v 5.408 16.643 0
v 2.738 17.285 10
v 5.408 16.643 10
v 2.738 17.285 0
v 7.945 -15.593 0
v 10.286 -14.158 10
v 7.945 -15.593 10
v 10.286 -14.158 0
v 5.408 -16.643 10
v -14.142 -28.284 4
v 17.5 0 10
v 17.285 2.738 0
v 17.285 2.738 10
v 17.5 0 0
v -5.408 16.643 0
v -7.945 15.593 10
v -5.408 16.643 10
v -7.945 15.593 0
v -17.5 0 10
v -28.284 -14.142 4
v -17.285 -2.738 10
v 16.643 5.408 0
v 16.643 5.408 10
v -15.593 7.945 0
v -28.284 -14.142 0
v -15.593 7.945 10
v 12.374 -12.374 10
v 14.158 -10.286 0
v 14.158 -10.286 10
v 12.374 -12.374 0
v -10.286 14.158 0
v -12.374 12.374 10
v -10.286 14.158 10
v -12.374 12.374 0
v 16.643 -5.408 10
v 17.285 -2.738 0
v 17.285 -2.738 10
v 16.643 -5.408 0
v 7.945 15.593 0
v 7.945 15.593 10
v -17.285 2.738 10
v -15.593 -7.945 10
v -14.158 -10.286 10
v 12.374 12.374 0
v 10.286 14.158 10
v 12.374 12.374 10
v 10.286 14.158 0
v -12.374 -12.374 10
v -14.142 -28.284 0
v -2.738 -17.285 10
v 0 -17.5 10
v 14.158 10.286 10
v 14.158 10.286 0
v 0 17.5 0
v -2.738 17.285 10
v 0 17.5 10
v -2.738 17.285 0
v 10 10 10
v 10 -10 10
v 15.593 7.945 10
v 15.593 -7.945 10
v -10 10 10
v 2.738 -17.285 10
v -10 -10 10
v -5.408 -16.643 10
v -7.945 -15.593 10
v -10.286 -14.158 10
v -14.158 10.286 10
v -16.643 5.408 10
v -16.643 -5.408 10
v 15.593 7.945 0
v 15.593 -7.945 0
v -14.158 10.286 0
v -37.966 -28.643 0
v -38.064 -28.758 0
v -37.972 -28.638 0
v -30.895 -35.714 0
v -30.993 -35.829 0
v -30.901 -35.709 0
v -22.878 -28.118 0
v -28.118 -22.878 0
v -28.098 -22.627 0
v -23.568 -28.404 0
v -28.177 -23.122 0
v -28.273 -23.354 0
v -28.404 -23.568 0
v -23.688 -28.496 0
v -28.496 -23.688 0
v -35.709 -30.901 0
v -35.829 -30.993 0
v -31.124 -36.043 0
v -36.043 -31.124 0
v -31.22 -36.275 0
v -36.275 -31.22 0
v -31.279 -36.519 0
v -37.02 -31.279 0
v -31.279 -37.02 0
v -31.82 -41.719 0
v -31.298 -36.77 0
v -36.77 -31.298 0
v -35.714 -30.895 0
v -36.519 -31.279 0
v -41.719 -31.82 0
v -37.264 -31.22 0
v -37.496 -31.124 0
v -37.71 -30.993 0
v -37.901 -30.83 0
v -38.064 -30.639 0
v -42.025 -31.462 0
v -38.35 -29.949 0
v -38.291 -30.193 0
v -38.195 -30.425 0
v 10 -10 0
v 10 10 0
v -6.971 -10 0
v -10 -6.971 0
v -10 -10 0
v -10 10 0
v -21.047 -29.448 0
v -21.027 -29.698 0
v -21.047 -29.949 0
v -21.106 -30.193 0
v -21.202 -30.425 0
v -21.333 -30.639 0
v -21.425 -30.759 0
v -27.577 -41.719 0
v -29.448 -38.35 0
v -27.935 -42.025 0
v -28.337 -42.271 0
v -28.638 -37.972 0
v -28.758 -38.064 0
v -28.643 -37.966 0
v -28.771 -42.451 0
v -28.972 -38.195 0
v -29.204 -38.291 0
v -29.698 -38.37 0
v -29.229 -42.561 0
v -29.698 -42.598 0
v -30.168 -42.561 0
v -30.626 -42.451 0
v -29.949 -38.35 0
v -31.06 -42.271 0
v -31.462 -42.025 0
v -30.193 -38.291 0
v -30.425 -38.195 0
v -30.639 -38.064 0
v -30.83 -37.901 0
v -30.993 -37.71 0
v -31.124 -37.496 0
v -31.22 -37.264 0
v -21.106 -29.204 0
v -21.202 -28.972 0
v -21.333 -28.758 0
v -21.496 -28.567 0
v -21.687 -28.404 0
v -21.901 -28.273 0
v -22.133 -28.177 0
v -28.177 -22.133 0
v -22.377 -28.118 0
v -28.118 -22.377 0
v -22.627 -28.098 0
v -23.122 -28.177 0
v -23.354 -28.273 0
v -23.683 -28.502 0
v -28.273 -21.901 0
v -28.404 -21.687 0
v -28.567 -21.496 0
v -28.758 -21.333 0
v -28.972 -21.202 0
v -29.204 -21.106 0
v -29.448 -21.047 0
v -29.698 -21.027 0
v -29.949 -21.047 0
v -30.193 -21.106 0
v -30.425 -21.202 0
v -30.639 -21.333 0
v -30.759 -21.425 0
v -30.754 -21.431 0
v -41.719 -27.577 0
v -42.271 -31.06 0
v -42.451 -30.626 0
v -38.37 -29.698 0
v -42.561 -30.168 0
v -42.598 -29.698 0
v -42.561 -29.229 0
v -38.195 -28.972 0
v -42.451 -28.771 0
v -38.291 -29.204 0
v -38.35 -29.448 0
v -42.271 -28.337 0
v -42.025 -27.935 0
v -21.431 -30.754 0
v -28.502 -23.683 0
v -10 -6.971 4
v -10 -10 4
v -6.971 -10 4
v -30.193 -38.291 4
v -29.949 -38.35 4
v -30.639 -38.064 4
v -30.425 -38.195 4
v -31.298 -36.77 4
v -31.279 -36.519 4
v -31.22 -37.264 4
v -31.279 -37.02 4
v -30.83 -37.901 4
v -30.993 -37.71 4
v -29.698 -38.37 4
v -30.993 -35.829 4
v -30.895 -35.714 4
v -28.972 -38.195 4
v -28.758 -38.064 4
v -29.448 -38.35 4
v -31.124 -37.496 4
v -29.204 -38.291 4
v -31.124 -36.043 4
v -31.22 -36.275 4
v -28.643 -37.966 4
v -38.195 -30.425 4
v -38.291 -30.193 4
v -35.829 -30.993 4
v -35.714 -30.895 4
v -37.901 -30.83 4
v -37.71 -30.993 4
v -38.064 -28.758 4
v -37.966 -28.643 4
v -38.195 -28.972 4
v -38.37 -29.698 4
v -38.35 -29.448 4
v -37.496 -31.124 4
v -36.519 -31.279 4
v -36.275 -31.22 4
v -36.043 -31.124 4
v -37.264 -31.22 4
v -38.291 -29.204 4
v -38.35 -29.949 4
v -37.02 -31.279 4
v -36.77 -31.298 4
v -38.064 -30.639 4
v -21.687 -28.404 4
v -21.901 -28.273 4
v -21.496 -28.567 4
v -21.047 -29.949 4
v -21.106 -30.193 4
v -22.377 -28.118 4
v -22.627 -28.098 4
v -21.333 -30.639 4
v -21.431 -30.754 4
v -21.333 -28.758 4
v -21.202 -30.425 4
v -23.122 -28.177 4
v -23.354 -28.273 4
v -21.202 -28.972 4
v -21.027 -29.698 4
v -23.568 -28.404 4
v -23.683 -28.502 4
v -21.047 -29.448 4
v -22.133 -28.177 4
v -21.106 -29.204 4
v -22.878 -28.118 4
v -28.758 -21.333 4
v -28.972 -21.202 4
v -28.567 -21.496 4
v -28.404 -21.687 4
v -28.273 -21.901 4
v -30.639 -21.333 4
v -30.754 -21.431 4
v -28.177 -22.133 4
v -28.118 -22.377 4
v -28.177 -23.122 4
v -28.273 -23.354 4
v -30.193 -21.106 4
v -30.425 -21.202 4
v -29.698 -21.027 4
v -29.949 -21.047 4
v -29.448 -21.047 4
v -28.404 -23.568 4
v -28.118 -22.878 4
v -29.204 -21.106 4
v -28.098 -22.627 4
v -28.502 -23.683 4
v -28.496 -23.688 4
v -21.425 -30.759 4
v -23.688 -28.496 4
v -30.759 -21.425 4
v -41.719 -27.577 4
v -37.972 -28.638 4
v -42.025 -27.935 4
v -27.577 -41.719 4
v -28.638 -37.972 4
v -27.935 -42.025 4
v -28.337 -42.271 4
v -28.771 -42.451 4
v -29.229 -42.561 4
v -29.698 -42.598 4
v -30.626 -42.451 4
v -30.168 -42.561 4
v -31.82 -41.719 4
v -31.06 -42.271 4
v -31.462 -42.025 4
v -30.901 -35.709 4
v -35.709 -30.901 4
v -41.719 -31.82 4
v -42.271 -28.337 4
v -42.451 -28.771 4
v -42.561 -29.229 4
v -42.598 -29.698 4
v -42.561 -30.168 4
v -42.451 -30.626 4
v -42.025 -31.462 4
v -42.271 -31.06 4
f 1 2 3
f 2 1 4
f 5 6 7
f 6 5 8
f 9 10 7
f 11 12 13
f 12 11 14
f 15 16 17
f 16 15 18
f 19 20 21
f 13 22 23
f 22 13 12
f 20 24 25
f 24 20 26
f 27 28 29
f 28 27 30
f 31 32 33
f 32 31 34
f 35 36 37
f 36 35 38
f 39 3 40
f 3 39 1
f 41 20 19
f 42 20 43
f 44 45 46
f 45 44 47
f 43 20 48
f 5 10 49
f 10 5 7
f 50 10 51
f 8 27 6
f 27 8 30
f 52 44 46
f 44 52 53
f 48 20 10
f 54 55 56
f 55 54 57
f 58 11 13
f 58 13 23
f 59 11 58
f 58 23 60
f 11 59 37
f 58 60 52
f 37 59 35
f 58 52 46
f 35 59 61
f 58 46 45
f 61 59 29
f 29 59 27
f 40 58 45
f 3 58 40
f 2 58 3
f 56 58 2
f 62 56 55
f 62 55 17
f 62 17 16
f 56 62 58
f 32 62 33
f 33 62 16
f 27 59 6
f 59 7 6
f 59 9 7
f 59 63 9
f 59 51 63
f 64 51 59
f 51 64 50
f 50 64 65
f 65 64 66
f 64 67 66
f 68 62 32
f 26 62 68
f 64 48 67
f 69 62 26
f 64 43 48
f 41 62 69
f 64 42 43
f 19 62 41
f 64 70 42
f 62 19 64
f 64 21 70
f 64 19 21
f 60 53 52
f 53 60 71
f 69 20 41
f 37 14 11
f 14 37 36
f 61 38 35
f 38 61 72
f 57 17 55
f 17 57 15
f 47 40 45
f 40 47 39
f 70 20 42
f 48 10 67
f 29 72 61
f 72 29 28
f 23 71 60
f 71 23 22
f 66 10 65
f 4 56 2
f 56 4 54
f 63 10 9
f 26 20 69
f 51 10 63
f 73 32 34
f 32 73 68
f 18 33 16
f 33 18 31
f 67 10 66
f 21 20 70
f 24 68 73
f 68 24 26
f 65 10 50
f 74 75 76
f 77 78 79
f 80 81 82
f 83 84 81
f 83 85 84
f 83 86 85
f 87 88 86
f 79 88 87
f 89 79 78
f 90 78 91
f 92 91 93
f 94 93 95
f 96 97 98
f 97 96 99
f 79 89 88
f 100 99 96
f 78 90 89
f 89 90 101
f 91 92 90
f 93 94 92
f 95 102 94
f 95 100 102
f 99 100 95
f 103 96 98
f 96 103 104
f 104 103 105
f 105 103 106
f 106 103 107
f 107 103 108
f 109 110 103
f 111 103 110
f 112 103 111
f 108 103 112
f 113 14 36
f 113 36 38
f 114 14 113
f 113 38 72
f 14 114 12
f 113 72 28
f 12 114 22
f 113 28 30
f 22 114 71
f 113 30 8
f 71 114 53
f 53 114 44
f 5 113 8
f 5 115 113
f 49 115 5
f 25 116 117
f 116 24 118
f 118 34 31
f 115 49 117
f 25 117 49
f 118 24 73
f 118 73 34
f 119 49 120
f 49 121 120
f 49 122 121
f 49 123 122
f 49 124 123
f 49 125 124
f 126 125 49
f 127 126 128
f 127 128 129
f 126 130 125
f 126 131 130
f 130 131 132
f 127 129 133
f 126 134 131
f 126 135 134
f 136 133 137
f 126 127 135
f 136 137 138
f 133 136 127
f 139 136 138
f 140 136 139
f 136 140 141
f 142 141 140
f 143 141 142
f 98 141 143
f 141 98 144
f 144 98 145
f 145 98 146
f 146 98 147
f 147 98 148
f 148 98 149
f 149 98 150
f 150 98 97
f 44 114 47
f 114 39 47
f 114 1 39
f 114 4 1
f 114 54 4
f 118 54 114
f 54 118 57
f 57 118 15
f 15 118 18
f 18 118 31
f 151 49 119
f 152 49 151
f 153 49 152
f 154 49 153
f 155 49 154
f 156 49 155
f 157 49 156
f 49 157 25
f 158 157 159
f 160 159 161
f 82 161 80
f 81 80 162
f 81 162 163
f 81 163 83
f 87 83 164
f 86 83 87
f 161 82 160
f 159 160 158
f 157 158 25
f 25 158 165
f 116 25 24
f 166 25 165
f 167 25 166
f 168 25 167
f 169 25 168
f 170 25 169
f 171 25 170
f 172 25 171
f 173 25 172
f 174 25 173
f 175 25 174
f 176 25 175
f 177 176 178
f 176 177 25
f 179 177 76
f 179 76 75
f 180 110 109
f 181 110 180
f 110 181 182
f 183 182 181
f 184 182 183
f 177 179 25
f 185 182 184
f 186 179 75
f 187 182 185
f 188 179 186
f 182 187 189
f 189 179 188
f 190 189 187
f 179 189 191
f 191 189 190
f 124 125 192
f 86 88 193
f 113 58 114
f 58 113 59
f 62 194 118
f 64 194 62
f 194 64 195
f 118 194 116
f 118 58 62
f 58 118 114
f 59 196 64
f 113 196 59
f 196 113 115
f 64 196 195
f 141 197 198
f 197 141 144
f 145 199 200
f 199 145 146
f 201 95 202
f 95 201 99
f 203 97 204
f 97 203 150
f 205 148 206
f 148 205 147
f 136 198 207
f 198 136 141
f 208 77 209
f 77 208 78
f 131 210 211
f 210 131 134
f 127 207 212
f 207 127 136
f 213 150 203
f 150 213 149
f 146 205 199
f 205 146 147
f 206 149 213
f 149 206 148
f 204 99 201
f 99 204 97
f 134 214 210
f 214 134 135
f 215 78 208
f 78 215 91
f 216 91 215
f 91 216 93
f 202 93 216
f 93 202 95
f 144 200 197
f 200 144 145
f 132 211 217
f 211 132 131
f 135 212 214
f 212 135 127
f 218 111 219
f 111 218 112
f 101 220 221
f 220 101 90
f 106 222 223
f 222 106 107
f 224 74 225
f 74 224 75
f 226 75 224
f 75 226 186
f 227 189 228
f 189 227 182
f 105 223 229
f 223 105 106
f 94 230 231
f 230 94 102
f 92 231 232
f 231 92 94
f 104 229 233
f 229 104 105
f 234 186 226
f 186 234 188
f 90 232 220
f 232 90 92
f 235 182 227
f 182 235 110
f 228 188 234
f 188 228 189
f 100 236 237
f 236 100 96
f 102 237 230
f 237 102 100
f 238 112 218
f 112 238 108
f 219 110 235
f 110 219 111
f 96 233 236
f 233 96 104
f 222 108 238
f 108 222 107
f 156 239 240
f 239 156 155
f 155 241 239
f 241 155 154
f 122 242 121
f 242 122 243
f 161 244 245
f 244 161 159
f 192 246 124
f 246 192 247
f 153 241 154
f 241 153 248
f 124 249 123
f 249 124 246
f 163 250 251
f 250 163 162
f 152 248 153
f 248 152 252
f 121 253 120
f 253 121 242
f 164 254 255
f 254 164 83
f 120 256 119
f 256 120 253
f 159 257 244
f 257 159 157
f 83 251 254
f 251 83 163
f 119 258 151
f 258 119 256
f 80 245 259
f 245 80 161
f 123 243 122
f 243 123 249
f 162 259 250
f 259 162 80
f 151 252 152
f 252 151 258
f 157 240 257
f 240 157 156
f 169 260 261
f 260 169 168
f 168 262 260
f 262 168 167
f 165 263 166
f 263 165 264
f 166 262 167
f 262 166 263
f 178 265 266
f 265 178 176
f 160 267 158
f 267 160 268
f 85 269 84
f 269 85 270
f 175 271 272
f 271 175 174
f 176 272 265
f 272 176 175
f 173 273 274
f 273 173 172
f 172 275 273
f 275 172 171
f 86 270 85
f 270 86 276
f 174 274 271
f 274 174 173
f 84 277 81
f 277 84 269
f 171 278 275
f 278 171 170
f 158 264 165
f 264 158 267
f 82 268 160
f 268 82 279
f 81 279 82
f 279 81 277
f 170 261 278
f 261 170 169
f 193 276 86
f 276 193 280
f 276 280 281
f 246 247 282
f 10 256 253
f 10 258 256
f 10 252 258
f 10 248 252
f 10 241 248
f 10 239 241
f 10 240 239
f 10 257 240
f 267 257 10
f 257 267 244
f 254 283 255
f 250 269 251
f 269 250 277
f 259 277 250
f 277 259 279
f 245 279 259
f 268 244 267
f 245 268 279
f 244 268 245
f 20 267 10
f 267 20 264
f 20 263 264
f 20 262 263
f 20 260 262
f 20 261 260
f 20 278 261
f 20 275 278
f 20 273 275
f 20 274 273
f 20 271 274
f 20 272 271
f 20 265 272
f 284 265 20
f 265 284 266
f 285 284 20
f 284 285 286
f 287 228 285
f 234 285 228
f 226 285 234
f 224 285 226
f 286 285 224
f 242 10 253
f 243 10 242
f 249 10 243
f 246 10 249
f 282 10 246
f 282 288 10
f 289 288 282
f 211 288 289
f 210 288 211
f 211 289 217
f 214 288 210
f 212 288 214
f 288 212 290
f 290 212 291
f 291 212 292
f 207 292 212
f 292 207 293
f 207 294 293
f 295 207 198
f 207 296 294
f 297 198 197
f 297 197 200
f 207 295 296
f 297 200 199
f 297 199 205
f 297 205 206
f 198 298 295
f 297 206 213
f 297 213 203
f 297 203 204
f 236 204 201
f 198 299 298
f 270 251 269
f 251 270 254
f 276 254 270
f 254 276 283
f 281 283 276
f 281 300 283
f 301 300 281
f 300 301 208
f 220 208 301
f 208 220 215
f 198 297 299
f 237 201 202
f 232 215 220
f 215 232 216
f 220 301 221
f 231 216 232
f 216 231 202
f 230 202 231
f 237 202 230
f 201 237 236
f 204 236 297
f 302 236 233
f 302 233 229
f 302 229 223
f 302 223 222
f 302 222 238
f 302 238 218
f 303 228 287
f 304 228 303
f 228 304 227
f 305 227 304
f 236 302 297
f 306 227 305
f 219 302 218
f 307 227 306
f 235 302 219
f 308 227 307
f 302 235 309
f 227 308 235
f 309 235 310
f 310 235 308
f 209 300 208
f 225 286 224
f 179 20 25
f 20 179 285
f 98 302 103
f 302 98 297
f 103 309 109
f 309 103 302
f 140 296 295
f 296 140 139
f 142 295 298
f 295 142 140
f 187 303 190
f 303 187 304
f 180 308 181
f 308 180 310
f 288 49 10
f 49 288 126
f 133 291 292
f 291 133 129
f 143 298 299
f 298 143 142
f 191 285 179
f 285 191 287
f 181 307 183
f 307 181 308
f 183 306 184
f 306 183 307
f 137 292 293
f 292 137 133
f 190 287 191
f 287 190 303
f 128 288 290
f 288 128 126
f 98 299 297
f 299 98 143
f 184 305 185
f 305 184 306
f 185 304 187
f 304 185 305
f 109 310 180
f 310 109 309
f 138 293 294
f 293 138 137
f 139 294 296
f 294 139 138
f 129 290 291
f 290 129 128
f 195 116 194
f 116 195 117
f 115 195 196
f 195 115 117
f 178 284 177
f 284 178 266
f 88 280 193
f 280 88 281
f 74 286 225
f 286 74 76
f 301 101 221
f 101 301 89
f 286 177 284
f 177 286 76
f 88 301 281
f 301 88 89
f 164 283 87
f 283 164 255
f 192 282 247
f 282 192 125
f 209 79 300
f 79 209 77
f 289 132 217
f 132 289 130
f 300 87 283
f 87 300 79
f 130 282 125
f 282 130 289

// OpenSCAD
homeAngle = 45 ;


if(true){
difference(){

hull(){
translate([0,0,0])cylinder(r=35/2, h=1, $fn=40);
translate([0,0,9])cylinder(r=35/2, h=1, $fn=40);
rotate([0,0,homeAngle])translate([-30,-20/2,0])cube([30,20,4]); 
}

translate([-20/2,-20/2,-1])cube([20,20,42]);   
 
}

rotate([0,0,homeAngle])
difference(){
    
hull(){
translate([-52+3,-20/2+3,0])cylinder(r=6/2, h=4, $fn=40);
translate([-52+3, 20/2-3,0])cylinder(r=6/2, h=4, $fn=40);
translate([-18+3,-20/2+3,0])cylinder(r=6/2, h=4, $fn=40);
translate([-18+3, 20/2-3,0])cylinder(r=6/2, h=4, $fn=40);
}

    rotate([0,0,-homeAngle])translate([-20/2,-20/2,-1])cube([20,20,42]);
    
    translate([-52+10-(15-3.2-3.2/2)/2,+5-3.2/2,-1])cube([15-3.2-3.2/2,3.2,15]); 
    translate([-52+10-(15-3.2-3.2/2)/2,-5-3.2/2,-1])cube([15-3.2-3.2/2,3.2,15]); 
    
    for ( i = [1 : 3] ){
        x = -52 + 5*i;
        translate([x,-5,-1])cylinder(r=3.2/2, h=15, $fn=40);
        translate([x,+5,-1])cylinder(r=3.2/2, h=15, $fn=40);
    }
}

}





//t
